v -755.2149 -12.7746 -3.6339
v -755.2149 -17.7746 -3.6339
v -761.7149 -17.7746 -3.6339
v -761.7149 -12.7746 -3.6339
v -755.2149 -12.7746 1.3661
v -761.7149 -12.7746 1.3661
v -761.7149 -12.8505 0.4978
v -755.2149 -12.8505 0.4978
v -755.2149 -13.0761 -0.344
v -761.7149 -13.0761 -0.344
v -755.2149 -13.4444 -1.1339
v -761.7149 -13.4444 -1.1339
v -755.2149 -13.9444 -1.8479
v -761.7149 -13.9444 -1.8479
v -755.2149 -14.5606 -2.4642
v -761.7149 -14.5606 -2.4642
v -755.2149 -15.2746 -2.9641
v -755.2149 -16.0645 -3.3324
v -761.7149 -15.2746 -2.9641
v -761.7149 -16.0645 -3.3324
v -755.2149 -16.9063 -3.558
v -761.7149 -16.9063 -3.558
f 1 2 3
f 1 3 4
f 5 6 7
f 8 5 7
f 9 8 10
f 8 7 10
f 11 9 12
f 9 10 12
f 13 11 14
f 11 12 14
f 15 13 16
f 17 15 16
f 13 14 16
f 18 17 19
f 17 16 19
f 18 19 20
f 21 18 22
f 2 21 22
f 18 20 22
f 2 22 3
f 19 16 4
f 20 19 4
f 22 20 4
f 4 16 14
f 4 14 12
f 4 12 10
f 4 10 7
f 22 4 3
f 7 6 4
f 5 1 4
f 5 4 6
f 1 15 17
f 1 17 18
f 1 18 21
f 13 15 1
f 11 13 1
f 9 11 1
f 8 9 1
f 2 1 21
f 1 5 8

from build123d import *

# Parameters (mm, degrees)
CIRCLE008_R        = 5
EXTRUSION037_DEPTH = 6.500001
RECTANGLE020_W     = 5
RECTANGLE020_H     = 5
EXTRUSION036_DEPTH = 6.500001


with BuildPart() as extrusion037:
    # Circle008 (on Extrusion) → Extrusion037 (new body)
    with BuildSketch(Plane(origin=(-761.714853, -17.774575, 1.366052), x_dir=(0, -1, 0), z_dir=(-1, 0, 0))):
        Circle(CIRCLE008_R)
    extrude(amount=-EXTRUSION037_DEPTH)


with BuildPart() as cut004006005004002008019023005025018:
    # Rectangle020 (on Cut) → Extrusion036 (new body)
    with BuildSketch(Plane(origin=(-755.214852, -17.774575, -3.633948), x_dir=(0, 1, 0), z_dir=(1, 0, 0))):
        with Locations((2.5, 2.5)):
            Rectangle(RECTANGLE020_W, RECTANGLE020_H)
    extrude(amount=-EXTRUSION036_DEPTH)

    # Cut004006005004002008019023005025018: cut Extrusion037
    add(extrusion037.part, mode=Mode.SUBTRACT)


solid = cut004006005004002008019023005025018.part
